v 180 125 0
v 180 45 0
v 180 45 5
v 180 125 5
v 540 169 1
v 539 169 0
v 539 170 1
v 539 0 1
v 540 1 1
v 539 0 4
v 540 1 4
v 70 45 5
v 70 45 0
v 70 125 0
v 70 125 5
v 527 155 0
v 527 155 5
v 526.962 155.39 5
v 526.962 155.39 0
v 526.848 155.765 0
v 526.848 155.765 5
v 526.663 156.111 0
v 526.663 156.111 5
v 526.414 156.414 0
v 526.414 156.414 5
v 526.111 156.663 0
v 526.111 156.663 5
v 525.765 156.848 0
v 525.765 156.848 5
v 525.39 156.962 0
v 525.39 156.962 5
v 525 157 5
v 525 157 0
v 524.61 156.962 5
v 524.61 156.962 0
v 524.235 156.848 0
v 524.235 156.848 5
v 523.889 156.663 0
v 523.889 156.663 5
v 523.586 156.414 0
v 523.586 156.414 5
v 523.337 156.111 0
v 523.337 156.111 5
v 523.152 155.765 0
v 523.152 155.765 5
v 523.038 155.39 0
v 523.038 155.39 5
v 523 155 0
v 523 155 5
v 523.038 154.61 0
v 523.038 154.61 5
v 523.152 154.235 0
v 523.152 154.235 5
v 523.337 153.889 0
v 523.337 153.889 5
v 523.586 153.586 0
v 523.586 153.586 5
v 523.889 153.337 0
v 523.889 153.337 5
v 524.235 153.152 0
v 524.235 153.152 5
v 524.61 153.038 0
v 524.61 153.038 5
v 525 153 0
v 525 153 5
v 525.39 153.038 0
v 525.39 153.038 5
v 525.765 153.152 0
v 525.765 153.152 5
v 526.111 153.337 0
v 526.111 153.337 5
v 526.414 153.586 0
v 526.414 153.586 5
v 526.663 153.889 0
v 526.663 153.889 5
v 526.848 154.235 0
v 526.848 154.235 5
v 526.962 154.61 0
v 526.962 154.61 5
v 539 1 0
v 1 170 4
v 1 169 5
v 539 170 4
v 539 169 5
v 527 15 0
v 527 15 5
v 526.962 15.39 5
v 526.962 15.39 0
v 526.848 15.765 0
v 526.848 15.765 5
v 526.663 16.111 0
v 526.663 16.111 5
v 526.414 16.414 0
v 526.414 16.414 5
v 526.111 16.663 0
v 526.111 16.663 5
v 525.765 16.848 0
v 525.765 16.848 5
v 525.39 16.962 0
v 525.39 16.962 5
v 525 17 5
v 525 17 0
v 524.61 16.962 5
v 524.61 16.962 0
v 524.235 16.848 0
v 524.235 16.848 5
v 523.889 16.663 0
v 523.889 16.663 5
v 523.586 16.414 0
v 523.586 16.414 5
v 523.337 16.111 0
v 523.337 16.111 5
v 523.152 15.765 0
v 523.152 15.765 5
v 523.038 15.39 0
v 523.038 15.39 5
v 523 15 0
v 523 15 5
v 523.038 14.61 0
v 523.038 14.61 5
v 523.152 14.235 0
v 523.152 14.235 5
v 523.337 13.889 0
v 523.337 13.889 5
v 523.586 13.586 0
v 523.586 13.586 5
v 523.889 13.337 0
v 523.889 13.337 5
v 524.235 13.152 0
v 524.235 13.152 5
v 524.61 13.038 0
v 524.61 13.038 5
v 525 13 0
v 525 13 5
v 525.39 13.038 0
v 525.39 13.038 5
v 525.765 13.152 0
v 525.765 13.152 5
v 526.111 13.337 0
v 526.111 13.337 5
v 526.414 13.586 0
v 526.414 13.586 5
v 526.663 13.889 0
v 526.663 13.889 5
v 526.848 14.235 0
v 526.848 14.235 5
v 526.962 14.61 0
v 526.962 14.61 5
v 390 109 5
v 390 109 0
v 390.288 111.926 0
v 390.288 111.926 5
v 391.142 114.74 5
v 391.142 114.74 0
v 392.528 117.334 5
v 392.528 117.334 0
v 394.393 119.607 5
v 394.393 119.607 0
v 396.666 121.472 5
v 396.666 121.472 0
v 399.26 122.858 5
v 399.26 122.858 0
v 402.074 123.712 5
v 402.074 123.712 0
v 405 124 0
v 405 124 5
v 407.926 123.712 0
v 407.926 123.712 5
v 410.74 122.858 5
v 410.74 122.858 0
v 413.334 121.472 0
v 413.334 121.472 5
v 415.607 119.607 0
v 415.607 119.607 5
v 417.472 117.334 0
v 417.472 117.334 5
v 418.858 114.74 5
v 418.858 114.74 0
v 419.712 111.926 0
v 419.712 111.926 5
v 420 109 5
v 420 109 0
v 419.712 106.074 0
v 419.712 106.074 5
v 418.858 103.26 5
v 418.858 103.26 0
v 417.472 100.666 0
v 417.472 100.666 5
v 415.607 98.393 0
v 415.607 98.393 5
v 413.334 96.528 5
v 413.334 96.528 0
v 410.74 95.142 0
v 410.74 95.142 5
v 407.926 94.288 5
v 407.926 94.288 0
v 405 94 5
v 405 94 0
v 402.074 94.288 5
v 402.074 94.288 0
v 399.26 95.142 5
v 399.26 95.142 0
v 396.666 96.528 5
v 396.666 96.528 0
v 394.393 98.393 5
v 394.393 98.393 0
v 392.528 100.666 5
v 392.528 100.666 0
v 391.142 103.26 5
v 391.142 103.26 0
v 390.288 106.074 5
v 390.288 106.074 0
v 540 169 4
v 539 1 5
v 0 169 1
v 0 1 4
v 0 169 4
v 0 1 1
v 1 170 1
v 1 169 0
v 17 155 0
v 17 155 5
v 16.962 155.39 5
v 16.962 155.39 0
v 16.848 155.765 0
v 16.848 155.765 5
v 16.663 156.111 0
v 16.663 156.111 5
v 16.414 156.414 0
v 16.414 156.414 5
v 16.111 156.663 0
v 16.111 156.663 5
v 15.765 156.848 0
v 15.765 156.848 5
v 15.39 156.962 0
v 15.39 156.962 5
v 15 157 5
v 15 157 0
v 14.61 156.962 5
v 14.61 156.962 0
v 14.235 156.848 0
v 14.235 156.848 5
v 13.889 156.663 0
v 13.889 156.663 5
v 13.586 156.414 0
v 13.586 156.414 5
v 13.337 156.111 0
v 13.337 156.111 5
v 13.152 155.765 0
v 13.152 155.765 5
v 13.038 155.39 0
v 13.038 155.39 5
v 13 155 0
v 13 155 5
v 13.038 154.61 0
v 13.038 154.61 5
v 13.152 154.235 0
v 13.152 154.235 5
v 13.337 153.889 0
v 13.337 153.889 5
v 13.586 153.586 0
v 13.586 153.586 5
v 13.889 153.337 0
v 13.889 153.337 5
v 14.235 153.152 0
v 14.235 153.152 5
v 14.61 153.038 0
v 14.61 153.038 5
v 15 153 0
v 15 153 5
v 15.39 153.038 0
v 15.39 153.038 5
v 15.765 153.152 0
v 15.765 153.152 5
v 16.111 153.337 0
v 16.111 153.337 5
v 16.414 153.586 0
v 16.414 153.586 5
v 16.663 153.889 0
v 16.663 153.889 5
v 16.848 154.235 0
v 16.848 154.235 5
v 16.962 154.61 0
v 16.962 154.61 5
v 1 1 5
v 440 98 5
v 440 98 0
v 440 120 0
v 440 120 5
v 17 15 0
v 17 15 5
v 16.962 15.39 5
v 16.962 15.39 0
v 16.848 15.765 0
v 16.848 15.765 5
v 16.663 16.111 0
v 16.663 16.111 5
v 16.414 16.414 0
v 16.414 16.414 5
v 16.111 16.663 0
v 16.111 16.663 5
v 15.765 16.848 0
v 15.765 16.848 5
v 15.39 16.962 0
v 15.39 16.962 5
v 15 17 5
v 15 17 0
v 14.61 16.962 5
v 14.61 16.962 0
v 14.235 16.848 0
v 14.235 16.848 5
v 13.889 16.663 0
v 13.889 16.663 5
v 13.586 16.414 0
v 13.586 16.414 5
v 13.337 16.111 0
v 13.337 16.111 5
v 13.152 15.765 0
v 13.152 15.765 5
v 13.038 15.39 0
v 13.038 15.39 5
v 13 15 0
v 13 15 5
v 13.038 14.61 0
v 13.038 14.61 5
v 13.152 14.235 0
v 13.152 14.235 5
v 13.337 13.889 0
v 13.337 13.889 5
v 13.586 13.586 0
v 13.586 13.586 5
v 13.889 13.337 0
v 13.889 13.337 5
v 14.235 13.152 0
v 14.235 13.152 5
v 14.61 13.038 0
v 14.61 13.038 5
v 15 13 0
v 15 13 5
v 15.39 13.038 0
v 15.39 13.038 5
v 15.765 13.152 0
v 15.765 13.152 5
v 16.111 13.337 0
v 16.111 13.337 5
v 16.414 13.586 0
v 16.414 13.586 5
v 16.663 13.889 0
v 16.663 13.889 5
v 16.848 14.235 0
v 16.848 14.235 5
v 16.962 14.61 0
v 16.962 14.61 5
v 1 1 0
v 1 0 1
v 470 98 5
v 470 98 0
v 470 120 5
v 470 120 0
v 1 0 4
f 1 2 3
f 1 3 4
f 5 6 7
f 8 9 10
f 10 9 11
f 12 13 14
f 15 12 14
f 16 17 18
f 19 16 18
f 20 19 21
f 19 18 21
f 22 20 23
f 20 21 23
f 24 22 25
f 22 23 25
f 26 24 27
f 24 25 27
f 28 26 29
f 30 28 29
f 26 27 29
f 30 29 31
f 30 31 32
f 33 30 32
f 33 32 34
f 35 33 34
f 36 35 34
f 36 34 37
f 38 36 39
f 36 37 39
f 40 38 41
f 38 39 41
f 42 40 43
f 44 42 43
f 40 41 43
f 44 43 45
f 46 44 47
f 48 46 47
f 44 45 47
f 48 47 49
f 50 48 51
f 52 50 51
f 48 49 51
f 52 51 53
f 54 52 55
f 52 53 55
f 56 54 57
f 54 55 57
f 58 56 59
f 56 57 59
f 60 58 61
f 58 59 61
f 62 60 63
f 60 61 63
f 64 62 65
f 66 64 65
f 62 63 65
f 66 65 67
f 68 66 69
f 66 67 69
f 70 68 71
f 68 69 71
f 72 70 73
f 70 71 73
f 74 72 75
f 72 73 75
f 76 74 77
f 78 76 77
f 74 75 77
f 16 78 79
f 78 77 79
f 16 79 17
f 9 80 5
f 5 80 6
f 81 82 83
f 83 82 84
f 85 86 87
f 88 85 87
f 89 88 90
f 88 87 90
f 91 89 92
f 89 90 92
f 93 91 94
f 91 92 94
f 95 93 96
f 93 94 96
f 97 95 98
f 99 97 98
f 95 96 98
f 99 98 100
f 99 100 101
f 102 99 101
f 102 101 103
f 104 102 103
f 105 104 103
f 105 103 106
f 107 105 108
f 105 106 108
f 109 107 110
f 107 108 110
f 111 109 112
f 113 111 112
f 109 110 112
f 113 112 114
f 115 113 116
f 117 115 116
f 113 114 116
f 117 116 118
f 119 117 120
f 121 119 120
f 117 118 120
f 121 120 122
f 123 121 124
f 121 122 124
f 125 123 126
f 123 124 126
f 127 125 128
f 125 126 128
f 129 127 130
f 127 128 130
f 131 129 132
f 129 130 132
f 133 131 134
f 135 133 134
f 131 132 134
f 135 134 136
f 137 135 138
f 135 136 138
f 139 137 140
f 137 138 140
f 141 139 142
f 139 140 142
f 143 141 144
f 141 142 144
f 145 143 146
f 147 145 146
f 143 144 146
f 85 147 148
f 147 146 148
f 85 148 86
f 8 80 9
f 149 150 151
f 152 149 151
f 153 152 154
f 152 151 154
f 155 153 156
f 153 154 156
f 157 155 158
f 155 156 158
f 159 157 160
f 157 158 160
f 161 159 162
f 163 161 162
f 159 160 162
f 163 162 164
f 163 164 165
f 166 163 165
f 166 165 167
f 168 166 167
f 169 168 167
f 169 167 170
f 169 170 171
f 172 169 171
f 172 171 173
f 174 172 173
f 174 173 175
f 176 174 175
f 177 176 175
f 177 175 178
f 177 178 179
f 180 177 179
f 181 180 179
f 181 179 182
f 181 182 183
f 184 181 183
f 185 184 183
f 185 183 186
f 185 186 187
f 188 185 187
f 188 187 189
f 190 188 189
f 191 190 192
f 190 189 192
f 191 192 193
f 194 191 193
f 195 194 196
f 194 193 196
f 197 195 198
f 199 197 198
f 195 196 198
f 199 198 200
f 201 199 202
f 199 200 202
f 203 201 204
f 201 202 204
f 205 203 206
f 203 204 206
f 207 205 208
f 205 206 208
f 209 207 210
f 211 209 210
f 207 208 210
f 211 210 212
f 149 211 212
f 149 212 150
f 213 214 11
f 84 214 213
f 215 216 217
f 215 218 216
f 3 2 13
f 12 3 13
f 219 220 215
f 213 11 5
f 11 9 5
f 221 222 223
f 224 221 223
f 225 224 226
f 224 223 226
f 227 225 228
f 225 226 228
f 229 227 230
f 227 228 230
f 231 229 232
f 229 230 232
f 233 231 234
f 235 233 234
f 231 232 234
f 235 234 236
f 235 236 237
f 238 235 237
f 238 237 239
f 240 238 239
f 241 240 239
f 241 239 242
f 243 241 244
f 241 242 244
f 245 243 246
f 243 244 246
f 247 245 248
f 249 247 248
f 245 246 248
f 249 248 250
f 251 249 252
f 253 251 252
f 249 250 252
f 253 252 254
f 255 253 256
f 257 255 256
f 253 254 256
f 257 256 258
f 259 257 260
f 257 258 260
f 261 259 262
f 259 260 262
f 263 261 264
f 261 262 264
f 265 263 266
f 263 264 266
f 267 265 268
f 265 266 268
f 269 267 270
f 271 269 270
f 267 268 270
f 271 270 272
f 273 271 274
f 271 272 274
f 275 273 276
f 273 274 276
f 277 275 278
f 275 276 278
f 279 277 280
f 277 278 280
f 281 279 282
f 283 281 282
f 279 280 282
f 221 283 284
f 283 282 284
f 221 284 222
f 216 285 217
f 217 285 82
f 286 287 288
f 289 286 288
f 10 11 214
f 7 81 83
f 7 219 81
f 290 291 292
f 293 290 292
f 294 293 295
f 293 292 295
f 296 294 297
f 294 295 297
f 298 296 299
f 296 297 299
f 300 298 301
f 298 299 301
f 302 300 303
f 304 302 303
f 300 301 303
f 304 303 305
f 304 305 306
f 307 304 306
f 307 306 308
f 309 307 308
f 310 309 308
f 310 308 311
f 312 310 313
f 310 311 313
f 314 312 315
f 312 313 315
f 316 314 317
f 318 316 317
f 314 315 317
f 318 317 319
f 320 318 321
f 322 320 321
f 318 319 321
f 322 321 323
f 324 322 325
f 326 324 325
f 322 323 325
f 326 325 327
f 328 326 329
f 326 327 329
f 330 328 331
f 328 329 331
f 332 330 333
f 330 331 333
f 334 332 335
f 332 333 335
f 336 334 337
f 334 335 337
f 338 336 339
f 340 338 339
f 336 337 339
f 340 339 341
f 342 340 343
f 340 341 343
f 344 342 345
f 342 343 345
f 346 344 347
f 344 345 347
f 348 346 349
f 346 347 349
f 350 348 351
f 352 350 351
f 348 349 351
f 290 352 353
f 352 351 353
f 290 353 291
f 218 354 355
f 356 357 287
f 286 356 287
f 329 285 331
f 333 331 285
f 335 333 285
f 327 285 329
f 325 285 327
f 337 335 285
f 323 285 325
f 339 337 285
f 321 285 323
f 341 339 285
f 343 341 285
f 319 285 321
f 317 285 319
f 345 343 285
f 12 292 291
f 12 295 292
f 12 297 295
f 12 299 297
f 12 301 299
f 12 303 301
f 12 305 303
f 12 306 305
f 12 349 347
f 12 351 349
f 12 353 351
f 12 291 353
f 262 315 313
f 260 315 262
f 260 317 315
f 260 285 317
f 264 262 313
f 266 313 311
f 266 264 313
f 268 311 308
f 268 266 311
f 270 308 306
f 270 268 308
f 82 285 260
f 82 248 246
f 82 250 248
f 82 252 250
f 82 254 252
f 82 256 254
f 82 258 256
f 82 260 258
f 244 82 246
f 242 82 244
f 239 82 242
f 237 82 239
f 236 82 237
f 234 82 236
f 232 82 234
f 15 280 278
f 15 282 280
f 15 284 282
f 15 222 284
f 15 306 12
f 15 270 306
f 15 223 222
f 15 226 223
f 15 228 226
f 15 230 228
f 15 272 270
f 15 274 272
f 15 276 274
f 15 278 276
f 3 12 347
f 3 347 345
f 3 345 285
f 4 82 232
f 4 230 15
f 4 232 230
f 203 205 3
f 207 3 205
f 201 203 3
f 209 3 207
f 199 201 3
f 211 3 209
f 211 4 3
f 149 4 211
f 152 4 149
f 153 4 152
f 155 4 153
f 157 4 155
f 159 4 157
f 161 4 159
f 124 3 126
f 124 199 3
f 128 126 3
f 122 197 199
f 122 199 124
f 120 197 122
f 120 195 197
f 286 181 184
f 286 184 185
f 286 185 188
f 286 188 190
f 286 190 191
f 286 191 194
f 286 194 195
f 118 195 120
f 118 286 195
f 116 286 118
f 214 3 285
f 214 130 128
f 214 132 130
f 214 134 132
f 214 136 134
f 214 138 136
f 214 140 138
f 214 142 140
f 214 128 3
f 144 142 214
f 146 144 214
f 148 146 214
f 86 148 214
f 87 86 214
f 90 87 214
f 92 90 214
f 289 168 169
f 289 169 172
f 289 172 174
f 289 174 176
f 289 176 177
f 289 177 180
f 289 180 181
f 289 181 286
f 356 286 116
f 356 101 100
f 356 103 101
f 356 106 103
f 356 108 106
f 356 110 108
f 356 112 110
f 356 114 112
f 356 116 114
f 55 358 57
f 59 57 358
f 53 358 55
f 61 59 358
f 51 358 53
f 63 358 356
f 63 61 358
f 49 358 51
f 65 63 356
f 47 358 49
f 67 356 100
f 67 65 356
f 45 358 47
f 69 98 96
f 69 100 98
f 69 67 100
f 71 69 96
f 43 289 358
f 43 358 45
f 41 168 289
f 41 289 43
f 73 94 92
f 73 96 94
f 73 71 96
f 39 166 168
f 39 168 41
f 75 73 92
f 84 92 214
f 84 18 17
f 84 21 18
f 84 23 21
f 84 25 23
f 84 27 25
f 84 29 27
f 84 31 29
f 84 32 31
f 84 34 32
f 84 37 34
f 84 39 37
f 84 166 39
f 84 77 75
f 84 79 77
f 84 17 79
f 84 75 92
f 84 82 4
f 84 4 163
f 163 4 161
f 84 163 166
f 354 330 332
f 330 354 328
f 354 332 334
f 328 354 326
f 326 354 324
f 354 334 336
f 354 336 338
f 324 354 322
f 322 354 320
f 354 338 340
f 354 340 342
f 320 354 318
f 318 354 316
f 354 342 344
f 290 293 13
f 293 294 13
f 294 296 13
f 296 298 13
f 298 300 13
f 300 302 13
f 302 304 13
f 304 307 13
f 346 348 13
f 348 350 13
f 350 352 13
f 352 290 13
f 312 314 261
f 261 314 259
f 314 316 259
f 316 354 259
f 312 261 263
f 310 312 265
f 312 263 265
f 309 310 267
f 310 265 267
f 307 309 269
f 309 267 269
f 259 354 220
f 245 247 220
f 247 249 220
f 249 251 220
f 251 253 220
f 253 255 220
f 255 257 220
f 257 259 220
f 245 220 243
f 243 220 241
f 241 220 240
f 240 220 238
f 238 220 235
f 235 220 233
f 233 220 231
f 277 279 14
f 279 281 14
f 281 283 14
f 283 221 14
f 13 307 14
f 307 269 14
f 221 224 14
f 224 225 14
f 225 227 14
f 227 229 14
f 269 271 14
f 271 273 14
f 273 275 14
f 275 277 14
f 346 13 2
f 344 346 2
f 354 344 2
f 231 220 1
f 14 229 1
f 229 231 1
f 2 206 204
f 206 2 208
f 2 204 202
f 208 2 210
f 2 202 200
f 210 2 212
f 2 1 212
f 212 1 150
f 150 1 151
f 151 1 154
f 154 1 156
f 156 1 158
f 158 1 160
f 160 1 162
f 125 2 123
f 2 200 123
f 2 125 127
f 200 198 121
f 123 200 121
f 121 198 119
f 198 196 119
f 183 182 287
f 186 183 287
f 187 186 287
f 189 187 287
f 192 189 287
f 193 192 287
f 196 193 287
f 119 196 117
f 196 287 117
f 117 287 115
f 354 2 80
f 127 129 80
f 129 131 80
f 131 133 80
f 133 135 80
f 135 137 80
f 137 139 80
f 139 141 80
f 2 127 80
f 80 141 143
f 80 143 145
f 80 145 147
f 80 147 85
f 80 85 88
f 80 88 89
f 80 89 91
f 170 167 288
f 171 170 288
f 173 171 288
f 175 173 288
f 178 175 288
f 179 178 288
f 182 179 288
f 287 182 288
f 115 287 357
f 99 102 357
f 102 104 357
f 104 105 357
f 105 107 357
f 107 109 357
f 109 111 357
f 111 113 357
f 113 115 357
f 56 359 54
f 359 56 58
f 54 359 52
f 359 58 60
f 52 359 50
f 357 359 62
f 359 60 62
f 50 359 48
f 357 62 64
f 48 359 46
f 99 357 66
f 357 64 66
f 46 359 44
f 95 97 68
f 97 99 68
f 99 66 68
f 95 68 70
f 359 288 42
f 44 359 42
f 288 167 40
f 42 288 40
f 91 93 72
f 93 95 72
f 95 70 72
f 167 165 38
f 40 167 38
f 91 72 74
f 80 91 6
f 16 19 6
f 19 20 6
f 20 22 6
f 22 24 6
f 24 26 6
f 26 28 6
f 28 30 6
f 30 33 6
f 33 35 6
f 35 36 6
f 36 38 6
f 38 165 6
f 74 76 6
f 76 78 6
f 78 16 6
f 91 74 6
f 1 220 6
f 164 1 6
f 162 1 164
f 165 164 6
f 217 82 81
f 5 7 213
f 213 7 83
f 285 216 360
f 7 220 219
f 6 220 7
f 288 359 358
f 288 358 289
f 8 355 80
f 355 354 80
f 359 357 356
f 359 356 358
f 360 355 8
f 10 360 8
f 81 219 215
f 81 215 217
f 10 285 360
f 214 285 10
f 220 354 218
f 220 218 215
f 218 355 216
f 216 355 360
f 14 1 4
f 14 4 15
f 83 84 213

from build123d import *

# Parameters (mm, degrees)
SKETCH1_W           = 540
SKETCH1_H           = 170
BOSS_EXTRUDE1_DEPTH = 5
CHAMFER1_SIZE       = 1
SKETCH2_R           = 2
CUT_EXTRUDE1_DEPTH  = 5
SKETCH3_R           = 15
SKETCH3_W           = 30
SKETCH3_H           = 22
SKETCH3_W_2         = 110
SKETCH3_H_2         = 80
CUT_EXTRUDE2_DEPTH  = 10


with BuildPart() as part:
    # Sketch1 → Boss-Extrude1 (new body)
    with BuildSketch(Plane.XY):
        with Locations((270, 85)):
            Rectangle(SKETCH1_W, SKETCH1_H)
    extrude(amount=BOSS_EXTRUDE1_DEPTH)

    # Chamfer1
    chamfer1_edges = [part.edges().sort_by_distance(p)[0] for p in [
        (540, 85, 5),
        (270, 170, 5),
        (0, 85, 5),
        (270, 170, 0),
        (540, 85, 0),
        (270, 0, 0),
        (0, 85, 0),
        (0, 170, 2.5),
        (540, 170, 2.5),
        (540, 0, 2.5),
        (0, 0, 2.5),
        (270, 0, 5),
    ]]
    chamfer(chamfer1_edges, length=CHAMFER1_SIZE)

    # Sketch2 → Cut-Extrude1 (cut)
    with BuildSketch(Plane.XY.offset(5)):
        with Locations((525, 155)):
            Circle(SKETCH2_R)
        with Locations((525, 15)):
            Circle(SKETCH2_R)
        with Locations((15, 155)):
            Circle(SKETCH2_R)
        with Locations((15, 15)):
            Circle(SKETCH2_R)
    extrude(amount=-CUT_EXTRUDE1_DEPTH, mode=Mode.SUBTRACT)

    # Sketch3 → Cut-Extrude2 (cut)
    with BuildSketch(Plane(origin=(0, 0, 0), x_dir=(-1, 0, 0), z_dir=(0, 0, -1))):
        with Locations((-405, 109)):
            Circle(SKETCH3_R)
        with Locations((-455, 109)):
            Rectangle(SKETCH3_W, SKETCH3_H)
        with Locations((-125, 85)):
            Rectangle(SKETCH3_W_2, SKETCH3_H_2)
    extrude(amount=-CUT_EXTRUDE2_DEPTH, mode=Mode.SUBTRACT)


solid = part.part
